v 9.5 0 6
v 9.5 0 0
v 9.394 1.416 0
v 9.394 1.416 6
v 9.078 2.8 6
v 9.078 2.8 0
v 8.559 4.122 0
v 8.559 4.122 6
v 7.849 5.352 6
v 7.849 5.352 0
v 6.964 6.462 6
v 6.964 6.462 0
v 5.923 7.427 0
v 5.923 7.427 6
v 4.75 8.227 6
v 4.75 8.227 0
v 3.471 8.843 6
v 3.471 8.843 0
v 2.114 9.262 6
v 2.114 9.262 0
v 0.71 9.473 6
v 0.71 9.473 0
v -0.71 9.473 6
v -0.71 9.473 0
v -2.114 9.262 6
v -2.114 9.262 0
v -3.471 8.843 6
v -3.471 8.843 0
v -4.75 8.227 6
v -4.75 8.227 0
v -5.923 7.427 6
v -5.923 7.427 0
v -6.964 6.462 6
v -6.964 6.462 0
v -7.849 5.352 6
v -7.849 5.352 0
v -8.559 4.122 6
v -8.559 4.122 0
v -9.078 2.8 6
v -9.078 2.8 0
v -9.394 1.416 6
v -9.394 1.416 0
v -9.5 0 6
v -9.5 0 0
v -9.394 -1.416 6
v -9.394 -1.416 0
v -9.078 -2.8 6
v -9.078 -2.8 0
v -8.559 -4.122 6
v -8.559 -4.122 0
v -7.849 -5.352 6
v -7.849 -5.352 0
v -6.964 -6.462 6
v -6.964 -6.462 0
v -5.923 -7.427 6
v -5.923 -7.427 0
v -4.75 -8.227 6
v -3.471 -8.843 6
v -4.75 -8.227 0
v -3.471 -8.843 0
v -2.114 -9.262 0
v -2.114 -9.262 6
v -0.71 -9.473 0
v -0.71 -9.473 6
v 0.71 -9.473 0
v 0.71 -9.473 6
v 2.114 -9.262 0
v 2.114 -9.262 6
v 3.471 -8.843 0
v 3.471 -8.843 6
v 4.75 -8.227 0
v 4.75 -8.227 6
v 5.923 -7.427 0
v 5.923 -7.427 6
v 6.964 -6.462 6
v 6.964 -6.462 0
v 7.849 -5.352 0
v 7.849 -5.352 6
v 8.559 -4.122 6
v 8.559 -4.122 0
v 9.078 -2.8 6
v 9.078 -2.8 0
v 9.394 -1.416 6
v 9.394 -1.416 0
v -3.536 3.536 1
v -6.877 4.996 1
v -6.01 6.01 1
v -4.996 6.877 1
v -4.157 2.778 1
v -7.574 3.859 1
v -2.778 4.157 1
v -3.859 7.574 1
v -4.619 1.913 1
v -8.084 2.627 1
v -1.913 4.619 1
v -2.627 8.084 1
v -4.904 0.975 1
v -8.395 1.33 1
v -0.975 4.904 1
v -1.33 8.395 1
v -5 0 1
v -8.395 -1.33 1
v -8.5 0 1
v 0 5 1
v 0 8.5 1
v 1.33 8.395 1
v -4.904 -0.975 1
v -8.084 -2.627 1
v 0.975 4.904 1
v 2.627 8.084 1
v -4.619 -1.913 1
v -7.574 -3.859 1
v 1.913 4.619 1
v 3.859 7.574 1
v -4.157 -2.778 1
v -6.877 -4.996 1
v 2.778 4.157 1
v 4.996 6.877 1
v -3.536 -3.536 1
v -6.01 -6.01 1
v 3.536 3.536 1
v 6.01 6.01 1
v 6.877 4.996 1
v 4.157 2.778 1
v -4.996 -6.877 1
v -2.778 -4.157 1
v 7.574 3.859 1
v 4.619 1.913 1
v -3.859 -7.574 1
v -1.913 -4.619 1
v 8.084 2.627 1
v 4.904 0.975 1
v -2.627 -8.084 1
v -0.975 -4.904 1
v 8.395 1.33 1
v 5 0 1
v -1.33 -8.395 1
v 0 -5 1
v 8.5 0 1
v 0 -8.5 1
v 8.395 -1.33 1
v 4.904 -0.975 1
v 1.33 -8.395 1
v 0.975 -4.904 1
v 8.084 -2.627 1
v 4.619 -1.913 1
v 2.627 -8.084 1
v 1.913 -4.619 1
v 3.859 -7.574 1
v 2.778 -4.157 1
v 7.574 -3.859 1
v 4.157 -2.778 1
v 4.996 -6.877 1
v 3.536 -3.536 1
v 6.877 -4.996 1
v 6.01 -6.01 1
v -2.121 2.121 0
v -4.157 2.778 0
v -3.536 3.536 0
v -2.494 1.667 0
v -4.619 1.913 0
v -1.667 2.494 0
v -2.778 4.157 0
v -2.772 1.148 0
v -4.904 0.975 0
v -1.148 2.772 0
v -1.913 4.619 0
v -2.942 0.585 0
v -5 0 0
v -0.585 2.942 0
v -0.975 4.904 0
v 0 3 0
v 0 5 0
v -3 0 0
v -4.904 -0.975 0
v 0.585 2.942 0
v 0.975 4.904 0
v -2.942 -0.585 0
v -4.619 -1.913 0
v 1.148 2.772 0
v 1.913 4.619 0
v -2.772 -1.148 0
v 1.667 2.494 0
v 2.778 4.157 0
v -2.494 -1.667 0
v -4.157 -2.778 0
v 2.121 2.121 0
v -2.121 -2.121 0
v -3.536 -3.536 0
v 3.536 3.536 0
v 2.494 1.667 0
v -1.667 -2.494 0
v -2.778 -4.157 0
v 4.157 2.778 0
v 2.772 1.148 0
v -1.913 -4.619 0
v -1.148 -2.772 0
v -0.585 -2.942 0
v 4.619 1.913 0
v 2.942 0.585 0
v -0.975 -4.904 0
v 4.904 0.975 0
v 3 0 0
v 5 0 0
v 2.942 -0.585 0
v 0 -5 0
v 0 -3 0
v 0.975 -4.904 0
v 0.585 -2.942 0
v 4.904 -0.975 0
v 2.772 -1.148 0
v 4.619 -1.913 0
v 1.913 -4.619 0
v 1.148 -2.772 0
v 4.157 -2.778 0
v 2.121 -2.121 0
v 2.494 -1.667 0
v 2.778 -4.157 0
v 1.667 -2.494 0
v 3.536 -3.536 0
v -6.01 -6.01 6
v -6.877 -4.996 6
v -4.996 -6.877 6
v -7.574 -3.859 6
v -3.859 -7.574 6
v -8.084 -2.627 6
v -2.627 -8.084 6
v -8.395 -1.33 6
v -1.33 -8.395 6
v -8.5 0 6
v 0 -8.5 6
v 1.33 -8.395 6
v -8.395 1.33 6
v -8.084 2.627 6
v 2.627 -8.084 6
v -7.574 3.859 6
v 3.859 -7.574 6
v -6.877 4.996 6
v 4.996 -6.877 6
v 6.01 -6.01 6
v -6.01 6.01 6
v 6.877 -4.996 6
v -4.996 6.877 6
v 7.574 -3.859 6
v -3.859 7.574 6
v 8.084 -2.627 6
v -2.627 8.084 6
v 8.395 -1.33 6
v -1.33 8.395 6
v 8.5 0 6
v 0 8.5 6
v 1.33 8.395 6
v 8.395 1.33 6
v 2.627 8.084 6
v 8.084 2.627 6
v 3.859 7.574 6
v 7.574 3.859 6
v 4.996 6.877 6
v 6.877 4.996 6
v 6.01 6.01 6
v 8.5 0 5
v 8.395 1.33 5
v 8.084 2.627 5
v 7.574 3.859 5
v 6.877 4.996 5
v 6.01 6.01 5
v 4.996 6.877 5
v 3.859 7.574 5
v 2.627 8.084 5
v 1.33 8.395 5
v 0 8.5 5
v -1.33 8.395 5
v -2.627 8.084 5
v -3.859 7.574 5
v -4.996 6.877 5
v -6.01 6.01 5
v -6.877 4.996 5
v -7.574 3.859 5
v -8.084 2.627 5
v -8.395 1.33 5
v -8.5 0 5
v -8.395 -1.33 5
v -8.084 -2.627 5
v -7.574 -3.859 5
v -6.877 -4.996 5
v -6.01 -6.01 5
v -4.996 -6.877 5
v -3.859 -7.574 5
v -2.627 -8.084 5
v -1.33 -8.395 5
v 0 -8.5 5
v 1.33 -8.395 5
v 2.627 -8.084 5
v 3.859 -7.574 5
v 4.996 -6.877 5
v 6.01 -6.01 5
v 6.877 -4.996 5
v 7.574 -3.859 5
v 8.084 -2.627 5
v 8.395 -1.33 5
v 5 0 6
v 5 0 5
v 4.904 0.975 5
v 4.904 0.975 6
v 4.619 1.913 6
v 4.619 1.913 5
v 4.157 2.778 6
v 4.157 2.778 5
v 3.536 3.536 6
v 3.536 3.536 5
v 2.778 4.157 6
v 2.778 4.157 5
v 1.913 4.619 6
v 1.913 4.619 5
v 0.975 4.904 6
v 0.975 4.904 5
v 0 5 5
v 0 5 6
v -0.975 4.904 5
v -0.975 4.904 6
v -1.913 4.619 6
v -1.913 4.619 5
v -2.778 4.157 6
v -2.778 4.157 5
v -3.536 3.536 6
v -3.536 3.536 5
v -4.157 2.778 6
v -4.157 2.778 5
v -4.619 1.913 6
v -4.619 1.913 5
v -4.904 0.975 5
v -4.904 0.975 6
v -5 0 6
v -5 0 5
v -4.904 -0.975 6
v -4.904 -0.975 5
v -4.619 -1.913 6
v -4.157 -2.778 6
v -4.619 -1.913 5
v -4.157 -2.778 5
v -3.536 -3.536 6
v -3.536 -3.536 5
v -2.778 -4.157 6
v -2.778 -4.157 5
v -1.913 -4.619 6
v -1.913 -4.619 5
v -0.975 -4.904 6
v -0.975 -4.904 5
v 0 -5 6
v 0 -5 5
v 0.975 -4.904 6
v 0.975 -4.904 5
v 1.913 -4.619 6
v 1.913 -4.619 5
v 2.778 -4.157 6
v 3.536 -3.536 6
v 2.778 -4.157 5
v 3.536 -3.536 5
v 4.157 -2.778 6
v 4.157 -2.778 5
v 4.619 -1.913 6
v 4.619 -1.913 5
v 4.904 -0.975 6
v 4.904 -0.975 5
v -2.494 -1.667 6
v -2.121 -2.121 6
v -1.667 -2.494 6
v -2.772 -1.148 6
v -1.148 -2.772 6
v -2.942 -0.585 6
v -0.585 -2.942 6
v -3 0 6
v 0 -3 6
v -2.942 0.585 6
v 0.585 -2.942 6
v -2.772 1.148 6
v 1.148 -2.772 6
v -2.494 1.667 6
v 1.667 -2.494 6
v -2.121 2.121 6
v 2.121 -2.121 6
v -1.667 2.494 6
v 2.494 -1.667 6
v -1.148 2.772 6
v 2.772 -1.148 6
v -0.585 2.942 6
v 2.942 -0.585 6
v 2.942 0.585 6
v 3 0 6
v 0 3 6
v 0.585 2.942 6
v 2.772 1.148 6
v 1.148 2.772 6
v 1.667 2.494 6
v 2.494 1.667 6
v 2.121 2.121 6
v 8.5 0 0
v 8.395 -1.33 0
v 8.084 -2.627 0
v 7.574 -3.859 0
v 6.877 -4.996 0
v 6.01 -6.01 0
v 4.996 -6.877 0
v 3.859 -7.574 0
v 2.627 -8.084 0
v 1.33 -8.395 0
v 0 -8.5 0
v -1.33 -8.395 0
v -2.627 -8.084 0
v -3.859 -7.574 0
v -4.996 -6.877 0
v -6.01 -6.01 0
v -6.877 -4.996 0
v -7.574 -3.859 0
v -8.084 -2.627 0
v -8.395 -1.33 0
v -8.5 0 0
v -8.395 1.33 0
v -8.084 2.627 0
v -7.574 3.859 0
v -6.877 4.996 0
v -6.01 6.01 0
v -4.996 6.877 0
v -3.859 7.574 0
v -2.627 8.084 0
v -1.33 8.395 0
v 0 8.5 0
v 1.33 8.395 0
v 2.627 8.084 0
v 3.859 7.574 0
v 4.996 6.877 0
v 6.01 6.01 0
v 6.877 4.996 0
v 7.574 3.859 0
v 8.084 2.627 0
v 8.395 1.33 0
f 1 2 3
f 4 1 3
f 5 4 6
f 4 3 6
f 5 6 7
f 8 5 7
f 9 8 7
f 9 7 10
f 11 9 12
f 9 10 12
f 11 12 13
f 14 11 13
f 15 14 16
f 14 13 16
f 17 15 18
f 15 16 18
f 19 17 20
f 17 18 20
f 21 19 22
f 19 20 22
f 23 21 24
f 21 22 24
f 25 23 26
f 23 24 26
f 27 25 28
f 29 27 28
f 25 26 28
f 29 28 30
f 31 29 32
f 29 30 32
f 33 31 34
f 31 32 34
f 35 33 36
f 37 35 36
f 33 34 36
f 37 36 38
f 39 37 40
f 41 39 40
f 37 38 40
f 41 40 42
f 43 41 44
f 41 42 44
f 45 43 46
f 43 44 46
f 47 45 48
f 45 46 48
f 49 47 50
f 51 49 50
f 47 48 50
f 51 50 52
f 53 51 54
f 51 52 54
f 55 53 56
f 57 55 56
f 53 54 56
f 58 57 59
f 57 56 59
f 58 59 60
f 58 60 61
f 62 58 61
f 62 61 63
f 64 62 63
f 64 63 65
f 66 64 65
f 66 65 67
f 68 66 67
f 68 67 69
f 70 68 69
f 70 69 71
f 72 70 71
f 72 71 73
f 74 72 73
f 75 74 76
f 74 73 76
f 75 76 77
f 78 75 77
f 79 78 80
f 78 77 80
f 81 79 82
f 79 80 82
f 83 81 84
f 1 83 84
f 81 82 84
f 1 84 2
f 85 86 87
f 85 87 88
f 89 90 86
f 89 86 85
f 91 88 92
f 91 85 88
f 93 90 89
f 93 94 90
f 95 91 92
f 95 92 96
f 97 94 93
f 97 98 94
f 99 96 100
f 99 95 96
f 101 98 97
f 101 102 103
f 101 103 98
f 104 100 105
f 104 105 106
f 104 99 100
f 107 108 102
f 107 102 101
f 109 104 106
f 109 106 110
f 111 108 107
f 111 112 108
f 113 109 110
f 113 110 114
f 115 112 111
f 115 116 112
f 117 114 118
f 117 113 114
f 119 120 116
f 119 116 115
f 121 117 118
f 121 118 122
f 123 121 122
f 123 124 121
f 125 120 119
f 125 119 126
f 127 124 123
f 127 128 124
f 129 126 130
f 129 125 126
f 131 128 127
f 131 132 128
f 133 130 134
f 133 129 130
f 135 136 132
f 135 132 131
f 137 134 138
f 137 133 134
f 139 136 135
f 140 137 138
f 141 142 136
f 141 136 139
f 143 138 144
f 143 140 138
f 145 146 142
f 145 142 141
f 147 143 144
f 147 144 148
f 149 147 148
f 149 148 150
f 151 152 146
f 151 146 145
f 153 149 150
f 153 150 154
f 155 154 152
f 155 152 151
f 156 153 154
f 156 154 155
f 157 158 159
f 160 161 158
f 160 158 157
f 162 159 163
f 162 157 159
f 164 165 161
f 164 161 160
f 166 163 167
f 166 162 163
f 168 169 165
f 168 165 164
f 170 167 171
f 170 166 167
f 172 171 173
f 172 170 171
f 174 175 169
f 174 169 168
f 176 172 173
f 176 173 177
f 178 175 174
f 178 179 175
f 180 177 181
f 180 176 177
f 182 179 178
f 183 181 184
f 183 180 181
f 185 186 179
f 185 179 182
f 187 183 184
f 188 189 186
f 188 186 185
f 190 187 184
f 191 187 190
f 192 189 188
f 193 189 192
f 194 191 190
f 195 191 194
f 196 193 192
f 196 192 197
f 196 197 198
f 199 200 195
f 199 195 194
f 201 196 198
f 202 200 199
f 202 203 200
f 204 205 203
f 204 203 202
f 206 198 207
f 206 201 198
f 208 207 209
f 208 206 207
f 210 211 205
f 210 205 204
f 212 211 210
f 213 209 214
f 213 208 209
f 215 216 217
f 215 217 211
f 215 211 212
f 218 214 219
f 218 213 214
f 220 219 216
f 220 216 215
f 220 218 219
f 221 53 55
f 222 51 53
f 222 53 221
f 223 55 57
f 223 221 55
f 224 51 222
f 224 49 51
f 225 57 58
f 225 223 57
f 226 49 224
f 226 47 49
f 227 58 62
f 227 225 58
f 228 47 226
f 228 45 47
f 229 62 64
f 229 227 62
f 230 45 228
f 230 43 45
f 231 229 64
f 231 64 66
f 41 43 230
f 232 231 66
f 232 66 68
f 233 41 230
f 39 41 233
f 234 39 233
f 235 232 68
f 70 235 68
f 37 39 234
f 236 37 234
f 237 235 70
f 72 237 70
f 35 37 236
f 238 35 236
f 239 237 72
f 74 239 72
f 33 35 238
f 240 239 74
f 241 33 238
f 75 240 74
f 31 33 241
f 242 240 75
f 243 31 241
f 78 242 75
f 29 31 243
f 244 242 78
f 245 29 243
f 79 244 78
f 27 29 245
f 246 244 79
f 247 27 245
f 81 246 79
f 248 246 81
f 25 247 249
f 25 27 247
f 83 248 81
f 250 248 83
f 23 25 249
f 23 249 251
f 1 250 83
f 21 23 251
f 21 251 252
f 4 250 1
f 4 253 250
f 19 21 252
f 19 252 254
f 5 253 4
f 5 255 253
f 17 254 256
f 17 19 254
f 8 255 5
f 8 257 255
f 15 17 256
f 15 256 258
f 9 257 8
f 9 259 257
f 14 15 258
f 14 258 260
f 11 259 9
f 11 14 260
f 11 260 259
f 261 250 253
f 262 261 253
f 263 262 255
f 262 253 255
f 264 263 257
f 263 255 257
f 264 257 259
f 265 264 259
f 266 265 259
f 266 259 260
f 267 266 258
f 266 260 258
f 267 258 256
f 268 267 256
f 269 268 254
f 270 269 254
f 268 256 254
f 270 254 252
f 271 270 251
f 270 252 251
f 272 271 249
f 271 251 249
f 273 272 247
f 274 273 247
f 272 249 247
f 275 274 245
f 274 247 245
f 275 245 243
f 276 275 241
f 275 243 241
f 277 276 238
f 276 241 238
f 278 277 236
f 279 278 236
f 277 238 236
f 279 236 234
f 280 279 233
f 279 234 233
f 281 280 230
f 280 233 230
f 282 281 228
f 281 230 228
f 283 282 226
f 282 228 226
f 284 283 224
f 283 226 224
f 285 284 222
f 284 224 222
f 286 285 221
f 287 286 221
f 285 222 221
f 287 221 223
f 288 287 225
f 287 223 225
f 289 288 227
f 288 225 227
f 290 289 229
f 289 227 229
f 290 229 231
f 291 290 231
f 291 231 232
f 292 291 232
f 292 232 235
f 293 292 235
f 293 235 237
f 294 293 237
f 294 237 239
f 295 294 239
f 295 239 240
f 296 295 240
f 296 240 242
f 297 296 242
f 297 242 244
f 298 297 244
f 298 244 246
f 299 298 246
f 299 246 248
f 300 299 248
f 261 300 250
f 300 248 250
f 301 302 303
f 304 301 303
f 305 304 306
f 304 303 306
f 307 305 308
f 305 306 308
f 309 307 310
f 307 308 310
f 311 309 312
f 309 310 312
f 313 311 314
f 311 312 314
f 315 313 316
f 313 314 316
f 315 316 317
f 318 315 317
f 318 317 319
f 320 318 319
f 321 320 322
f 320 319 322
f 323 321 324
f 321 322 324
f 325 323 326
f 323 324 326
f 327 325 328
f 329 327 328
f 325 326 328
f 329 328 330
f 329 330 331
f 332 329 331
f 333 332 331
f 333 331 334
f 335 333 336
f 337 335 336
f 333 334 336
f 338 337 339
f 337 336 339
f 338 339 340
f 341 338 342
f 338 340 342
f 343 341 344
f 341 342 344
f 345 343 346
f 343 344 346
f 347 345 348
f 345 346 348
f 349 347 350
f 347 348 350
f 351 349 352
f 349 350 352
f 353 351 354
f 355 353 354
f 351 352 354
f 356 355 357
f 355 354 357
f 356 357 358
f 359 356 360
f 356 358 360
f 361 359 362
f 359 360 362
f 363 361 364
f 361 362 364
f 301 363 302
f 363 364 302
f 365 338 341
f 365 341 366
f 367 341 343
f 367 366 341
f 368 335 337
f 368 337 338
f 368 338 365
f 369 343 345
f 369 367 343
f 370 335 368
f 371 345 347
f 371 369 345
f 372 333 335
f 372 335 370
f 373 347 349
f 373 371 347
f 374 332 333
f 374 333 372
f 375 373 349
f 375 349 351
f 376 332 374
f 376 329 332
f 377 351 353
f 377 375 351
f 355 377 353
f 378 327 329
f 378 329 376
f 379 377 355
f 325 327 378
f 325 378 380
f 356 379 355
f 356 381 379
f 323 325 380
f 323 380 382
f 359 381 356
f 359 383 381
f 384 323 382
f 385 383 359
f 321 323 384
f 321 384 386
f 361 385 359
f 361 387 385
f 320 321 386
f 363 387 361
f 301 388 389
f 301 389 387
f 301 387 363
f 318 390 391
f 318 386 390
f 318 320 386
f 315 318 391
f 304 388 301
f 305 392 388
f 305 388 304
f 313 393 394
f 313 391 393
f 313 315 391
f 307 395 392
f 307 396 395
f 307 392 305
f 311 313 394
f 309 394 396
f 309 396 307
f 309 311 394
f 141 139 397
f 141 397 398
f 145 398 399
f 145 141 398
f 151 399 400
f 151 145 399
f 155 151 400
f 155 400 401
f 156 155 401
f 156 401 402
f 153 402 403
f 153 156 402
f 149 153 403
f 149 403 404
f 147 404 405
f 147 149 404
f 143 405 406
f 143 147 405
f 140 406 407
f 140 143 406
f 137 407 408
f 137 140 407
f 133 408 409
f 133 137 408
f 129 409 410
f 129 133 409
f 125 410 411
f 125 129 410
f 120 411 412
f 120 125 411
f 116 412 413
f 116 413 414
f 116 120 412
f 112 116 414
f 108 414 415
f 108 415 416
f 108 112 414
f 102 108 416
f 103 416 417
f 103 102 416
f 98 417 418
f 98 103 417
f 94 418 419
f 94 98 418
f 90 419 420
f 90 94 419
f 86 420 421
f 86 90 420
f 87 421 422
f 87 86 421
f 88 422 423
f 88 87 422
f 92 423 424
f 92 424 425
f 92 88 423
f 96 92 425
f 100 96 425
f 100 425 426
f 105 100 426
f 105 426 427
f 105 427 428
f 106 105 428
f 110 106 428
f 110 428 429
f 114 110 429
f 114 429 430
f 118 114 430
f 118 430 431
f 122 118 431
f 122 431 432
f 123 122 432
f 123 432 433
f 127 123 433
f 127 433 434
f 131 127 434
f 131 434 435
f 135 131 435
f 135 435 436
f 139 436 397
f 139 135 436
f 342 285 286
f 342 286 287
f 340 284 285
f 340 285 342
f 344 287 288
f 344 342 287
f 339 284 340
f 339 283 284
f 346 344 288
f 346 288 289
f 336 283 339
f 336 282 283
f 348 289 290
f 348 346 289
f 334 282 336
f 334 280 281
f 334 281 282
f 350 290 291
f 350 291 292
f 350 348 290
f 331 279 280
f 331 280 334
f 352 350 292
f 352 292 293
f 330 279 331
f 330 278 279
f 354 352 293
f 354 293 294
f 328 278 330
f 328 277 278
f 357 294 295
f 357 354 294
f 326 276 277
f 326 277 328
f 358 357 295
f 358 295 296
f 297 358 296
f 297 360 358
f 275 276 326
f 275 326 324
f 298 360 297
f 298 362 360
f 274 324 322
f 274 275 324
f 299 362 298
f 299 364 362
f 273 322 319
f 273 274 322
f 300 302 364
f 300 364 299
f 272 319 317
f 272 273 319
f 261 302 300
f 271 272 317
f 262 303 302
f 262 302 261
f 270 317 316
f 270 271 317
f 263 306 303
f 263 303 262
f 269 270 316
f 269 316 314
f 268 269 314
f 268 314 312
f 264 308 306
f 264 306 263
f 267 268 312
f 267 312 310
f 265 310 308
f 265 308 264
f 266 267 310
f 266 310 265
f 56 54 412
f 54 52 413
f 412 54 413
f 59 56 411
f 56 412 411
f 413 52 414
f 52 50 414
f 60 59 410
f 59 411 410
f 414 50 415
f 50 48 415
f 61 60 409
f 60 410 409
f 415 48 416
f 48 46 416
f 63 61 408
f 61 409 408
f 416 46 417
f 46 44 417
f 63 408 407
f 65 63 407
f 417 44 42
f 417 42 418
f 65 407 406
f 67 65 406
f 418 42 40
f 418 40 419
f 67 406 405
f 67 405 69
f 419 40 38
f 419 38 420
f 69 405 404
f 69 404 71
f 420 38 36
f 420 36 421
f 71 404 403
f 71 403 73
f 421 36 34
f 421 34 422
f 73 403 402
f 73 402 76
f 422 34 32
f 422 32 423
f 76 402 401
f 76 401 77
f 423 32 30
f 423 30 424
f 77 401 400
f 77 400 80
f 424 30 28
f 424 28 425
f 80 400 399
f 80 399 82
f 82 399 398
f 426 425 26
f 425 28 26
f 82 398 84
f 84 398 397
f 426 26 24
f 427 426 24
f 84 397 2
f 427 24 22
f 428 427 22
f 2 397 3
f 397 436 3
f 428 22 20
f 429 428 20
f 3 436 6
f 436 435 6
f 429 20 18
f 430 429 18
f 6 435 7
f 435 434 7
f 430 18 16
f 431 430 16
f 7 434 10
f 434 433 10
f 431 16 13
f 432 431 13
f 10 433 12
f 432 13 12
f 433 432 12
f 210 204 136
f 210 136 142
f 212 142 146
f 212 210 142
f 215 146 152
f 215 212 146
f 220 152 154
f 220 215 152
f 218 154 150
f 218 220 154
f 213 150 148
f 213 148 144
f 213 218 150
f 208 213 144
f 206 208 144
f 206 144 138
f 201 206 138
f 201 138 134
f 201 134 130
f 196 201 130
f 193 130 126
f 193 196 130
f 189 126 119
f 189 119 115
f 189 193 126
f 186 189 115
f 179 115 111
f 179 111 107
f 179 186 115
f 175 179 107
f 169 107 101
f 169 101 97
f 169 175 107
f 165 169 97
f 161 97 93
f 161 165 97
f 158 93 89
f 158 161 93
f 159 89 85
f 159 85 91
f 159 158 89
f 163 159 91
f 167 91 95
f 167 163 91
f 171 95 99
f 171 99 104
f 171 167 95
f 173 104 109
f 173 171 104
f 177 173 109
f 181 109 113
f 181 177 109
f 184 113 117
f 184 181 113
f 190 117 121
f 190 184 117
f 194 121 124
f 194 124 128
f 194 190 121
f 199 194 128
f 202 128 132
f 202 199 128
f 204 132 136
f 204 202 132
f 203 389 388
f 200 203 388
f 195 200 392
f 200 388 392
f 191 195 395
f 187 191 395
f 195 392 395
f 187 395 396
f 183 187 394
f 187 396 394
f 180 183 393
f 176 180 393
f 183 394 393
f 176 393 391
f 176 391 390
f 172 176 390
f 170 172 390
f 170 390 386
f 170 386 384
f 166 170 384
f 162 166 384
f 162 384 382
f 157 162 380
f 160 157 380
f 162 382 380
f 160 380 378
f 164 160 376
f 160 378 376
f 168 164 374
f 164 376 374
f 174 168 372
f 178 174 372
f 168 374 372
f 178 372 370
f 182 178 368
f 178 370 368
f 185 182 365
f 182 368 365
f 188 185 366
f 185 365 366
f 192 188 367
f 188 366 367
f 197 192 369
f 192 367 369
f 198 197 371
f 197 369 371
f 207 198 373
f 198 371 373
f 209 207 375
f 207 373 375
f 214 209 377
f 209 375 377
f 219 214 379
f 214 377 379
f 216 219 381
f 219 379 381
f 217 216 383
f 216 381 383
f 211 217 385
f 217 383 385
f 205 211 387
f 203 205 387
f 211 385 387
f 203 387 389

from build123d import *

# Parameters (mm, degrees)
SKETCH_1_R          = 9.5
EXTRUDE_1_DEPTH     = 6
SKETCH_2_R          = 8.5
CUT_EXTRUDE_1_DEPTH = 1
CUT_EXTRUDE_START   = -1
SKETCH_3_R          = 8.5
CUT_EXTRUDE_2_DEPTH = 1
SKETCH_4_R          = 5
EXTRUDE_4_DEPTH     = 1
EXTRUDE_START       = 1
SKETCH_6_R          = 5
EXTRUDE_5_DEPTH     = 1
SKETCH_7_R          = 3
CUT_EXTRUDE_3_DEPTH = 6


with BuildPart() as part:
    # 스케치1 → 돌출1 (new body)
    with BuildSketch(Plane.XY):
        Circle(SKETCH_1_R)
    extrude(amount=EXTRUDE_1_DEPTH)

    # 스케치2 → 컷-돌출1 (cut)
    with BuildSketch(Plane.XY.offset(6)):
        Circle(SKETCH_2_R)
    extrude(amount=-CUT_EXTRUDE_1_DEPTH, mode=Mode.SUBTRACT)

    # 스케치3 → 컷-돌출2 (cut)
    with BuildSketch(Plane(origin=(0, 0, 0), x_dir=(-1, 0, 0), z_dir=(0, 0, -1)).offset(CUT_EXTRUDE_START)):
        with Locations(Location((0, 0, 0), (0, 0, 180))):
            Circle(SKETCH_3_R)
    extrude(amount=CUT_EXTRUDE_2_DEPTH, mode=Mode.SUBTRACT)

    # 스케치4 → 돌출4 (add)
    with BuildSketch(Plane.XY.offset(5)):
        Circle(SKETCH_4_R)
    extrude(amount=EXTRUDE_4_DEPTH)

    # 스케치6 → 돌출5 (add)
    with BuildSketch(Plane(origin=(0, 0, 1), x_dir=(-1, 0, 0), z_dir=(0, 0, -1)).offset(EXTRUDE_START)):
        with Locations(Location((0, 0, 0), (0, 0, 180))):
            Circle(SKETCH_6_R)
    extrude(amount=-EXTRUDE_5_DEPTH)

    # 스케치7 → 컷-돌출3 (cut)
    with BuildSketch(Plane.XY.offset(6)):
        Circle(SKETCH_7_R)
    extrude(amount=-CUT_EXTRUDE_3_DEPTH, mode=Mode.SUBTRACT)


solid = part.part
